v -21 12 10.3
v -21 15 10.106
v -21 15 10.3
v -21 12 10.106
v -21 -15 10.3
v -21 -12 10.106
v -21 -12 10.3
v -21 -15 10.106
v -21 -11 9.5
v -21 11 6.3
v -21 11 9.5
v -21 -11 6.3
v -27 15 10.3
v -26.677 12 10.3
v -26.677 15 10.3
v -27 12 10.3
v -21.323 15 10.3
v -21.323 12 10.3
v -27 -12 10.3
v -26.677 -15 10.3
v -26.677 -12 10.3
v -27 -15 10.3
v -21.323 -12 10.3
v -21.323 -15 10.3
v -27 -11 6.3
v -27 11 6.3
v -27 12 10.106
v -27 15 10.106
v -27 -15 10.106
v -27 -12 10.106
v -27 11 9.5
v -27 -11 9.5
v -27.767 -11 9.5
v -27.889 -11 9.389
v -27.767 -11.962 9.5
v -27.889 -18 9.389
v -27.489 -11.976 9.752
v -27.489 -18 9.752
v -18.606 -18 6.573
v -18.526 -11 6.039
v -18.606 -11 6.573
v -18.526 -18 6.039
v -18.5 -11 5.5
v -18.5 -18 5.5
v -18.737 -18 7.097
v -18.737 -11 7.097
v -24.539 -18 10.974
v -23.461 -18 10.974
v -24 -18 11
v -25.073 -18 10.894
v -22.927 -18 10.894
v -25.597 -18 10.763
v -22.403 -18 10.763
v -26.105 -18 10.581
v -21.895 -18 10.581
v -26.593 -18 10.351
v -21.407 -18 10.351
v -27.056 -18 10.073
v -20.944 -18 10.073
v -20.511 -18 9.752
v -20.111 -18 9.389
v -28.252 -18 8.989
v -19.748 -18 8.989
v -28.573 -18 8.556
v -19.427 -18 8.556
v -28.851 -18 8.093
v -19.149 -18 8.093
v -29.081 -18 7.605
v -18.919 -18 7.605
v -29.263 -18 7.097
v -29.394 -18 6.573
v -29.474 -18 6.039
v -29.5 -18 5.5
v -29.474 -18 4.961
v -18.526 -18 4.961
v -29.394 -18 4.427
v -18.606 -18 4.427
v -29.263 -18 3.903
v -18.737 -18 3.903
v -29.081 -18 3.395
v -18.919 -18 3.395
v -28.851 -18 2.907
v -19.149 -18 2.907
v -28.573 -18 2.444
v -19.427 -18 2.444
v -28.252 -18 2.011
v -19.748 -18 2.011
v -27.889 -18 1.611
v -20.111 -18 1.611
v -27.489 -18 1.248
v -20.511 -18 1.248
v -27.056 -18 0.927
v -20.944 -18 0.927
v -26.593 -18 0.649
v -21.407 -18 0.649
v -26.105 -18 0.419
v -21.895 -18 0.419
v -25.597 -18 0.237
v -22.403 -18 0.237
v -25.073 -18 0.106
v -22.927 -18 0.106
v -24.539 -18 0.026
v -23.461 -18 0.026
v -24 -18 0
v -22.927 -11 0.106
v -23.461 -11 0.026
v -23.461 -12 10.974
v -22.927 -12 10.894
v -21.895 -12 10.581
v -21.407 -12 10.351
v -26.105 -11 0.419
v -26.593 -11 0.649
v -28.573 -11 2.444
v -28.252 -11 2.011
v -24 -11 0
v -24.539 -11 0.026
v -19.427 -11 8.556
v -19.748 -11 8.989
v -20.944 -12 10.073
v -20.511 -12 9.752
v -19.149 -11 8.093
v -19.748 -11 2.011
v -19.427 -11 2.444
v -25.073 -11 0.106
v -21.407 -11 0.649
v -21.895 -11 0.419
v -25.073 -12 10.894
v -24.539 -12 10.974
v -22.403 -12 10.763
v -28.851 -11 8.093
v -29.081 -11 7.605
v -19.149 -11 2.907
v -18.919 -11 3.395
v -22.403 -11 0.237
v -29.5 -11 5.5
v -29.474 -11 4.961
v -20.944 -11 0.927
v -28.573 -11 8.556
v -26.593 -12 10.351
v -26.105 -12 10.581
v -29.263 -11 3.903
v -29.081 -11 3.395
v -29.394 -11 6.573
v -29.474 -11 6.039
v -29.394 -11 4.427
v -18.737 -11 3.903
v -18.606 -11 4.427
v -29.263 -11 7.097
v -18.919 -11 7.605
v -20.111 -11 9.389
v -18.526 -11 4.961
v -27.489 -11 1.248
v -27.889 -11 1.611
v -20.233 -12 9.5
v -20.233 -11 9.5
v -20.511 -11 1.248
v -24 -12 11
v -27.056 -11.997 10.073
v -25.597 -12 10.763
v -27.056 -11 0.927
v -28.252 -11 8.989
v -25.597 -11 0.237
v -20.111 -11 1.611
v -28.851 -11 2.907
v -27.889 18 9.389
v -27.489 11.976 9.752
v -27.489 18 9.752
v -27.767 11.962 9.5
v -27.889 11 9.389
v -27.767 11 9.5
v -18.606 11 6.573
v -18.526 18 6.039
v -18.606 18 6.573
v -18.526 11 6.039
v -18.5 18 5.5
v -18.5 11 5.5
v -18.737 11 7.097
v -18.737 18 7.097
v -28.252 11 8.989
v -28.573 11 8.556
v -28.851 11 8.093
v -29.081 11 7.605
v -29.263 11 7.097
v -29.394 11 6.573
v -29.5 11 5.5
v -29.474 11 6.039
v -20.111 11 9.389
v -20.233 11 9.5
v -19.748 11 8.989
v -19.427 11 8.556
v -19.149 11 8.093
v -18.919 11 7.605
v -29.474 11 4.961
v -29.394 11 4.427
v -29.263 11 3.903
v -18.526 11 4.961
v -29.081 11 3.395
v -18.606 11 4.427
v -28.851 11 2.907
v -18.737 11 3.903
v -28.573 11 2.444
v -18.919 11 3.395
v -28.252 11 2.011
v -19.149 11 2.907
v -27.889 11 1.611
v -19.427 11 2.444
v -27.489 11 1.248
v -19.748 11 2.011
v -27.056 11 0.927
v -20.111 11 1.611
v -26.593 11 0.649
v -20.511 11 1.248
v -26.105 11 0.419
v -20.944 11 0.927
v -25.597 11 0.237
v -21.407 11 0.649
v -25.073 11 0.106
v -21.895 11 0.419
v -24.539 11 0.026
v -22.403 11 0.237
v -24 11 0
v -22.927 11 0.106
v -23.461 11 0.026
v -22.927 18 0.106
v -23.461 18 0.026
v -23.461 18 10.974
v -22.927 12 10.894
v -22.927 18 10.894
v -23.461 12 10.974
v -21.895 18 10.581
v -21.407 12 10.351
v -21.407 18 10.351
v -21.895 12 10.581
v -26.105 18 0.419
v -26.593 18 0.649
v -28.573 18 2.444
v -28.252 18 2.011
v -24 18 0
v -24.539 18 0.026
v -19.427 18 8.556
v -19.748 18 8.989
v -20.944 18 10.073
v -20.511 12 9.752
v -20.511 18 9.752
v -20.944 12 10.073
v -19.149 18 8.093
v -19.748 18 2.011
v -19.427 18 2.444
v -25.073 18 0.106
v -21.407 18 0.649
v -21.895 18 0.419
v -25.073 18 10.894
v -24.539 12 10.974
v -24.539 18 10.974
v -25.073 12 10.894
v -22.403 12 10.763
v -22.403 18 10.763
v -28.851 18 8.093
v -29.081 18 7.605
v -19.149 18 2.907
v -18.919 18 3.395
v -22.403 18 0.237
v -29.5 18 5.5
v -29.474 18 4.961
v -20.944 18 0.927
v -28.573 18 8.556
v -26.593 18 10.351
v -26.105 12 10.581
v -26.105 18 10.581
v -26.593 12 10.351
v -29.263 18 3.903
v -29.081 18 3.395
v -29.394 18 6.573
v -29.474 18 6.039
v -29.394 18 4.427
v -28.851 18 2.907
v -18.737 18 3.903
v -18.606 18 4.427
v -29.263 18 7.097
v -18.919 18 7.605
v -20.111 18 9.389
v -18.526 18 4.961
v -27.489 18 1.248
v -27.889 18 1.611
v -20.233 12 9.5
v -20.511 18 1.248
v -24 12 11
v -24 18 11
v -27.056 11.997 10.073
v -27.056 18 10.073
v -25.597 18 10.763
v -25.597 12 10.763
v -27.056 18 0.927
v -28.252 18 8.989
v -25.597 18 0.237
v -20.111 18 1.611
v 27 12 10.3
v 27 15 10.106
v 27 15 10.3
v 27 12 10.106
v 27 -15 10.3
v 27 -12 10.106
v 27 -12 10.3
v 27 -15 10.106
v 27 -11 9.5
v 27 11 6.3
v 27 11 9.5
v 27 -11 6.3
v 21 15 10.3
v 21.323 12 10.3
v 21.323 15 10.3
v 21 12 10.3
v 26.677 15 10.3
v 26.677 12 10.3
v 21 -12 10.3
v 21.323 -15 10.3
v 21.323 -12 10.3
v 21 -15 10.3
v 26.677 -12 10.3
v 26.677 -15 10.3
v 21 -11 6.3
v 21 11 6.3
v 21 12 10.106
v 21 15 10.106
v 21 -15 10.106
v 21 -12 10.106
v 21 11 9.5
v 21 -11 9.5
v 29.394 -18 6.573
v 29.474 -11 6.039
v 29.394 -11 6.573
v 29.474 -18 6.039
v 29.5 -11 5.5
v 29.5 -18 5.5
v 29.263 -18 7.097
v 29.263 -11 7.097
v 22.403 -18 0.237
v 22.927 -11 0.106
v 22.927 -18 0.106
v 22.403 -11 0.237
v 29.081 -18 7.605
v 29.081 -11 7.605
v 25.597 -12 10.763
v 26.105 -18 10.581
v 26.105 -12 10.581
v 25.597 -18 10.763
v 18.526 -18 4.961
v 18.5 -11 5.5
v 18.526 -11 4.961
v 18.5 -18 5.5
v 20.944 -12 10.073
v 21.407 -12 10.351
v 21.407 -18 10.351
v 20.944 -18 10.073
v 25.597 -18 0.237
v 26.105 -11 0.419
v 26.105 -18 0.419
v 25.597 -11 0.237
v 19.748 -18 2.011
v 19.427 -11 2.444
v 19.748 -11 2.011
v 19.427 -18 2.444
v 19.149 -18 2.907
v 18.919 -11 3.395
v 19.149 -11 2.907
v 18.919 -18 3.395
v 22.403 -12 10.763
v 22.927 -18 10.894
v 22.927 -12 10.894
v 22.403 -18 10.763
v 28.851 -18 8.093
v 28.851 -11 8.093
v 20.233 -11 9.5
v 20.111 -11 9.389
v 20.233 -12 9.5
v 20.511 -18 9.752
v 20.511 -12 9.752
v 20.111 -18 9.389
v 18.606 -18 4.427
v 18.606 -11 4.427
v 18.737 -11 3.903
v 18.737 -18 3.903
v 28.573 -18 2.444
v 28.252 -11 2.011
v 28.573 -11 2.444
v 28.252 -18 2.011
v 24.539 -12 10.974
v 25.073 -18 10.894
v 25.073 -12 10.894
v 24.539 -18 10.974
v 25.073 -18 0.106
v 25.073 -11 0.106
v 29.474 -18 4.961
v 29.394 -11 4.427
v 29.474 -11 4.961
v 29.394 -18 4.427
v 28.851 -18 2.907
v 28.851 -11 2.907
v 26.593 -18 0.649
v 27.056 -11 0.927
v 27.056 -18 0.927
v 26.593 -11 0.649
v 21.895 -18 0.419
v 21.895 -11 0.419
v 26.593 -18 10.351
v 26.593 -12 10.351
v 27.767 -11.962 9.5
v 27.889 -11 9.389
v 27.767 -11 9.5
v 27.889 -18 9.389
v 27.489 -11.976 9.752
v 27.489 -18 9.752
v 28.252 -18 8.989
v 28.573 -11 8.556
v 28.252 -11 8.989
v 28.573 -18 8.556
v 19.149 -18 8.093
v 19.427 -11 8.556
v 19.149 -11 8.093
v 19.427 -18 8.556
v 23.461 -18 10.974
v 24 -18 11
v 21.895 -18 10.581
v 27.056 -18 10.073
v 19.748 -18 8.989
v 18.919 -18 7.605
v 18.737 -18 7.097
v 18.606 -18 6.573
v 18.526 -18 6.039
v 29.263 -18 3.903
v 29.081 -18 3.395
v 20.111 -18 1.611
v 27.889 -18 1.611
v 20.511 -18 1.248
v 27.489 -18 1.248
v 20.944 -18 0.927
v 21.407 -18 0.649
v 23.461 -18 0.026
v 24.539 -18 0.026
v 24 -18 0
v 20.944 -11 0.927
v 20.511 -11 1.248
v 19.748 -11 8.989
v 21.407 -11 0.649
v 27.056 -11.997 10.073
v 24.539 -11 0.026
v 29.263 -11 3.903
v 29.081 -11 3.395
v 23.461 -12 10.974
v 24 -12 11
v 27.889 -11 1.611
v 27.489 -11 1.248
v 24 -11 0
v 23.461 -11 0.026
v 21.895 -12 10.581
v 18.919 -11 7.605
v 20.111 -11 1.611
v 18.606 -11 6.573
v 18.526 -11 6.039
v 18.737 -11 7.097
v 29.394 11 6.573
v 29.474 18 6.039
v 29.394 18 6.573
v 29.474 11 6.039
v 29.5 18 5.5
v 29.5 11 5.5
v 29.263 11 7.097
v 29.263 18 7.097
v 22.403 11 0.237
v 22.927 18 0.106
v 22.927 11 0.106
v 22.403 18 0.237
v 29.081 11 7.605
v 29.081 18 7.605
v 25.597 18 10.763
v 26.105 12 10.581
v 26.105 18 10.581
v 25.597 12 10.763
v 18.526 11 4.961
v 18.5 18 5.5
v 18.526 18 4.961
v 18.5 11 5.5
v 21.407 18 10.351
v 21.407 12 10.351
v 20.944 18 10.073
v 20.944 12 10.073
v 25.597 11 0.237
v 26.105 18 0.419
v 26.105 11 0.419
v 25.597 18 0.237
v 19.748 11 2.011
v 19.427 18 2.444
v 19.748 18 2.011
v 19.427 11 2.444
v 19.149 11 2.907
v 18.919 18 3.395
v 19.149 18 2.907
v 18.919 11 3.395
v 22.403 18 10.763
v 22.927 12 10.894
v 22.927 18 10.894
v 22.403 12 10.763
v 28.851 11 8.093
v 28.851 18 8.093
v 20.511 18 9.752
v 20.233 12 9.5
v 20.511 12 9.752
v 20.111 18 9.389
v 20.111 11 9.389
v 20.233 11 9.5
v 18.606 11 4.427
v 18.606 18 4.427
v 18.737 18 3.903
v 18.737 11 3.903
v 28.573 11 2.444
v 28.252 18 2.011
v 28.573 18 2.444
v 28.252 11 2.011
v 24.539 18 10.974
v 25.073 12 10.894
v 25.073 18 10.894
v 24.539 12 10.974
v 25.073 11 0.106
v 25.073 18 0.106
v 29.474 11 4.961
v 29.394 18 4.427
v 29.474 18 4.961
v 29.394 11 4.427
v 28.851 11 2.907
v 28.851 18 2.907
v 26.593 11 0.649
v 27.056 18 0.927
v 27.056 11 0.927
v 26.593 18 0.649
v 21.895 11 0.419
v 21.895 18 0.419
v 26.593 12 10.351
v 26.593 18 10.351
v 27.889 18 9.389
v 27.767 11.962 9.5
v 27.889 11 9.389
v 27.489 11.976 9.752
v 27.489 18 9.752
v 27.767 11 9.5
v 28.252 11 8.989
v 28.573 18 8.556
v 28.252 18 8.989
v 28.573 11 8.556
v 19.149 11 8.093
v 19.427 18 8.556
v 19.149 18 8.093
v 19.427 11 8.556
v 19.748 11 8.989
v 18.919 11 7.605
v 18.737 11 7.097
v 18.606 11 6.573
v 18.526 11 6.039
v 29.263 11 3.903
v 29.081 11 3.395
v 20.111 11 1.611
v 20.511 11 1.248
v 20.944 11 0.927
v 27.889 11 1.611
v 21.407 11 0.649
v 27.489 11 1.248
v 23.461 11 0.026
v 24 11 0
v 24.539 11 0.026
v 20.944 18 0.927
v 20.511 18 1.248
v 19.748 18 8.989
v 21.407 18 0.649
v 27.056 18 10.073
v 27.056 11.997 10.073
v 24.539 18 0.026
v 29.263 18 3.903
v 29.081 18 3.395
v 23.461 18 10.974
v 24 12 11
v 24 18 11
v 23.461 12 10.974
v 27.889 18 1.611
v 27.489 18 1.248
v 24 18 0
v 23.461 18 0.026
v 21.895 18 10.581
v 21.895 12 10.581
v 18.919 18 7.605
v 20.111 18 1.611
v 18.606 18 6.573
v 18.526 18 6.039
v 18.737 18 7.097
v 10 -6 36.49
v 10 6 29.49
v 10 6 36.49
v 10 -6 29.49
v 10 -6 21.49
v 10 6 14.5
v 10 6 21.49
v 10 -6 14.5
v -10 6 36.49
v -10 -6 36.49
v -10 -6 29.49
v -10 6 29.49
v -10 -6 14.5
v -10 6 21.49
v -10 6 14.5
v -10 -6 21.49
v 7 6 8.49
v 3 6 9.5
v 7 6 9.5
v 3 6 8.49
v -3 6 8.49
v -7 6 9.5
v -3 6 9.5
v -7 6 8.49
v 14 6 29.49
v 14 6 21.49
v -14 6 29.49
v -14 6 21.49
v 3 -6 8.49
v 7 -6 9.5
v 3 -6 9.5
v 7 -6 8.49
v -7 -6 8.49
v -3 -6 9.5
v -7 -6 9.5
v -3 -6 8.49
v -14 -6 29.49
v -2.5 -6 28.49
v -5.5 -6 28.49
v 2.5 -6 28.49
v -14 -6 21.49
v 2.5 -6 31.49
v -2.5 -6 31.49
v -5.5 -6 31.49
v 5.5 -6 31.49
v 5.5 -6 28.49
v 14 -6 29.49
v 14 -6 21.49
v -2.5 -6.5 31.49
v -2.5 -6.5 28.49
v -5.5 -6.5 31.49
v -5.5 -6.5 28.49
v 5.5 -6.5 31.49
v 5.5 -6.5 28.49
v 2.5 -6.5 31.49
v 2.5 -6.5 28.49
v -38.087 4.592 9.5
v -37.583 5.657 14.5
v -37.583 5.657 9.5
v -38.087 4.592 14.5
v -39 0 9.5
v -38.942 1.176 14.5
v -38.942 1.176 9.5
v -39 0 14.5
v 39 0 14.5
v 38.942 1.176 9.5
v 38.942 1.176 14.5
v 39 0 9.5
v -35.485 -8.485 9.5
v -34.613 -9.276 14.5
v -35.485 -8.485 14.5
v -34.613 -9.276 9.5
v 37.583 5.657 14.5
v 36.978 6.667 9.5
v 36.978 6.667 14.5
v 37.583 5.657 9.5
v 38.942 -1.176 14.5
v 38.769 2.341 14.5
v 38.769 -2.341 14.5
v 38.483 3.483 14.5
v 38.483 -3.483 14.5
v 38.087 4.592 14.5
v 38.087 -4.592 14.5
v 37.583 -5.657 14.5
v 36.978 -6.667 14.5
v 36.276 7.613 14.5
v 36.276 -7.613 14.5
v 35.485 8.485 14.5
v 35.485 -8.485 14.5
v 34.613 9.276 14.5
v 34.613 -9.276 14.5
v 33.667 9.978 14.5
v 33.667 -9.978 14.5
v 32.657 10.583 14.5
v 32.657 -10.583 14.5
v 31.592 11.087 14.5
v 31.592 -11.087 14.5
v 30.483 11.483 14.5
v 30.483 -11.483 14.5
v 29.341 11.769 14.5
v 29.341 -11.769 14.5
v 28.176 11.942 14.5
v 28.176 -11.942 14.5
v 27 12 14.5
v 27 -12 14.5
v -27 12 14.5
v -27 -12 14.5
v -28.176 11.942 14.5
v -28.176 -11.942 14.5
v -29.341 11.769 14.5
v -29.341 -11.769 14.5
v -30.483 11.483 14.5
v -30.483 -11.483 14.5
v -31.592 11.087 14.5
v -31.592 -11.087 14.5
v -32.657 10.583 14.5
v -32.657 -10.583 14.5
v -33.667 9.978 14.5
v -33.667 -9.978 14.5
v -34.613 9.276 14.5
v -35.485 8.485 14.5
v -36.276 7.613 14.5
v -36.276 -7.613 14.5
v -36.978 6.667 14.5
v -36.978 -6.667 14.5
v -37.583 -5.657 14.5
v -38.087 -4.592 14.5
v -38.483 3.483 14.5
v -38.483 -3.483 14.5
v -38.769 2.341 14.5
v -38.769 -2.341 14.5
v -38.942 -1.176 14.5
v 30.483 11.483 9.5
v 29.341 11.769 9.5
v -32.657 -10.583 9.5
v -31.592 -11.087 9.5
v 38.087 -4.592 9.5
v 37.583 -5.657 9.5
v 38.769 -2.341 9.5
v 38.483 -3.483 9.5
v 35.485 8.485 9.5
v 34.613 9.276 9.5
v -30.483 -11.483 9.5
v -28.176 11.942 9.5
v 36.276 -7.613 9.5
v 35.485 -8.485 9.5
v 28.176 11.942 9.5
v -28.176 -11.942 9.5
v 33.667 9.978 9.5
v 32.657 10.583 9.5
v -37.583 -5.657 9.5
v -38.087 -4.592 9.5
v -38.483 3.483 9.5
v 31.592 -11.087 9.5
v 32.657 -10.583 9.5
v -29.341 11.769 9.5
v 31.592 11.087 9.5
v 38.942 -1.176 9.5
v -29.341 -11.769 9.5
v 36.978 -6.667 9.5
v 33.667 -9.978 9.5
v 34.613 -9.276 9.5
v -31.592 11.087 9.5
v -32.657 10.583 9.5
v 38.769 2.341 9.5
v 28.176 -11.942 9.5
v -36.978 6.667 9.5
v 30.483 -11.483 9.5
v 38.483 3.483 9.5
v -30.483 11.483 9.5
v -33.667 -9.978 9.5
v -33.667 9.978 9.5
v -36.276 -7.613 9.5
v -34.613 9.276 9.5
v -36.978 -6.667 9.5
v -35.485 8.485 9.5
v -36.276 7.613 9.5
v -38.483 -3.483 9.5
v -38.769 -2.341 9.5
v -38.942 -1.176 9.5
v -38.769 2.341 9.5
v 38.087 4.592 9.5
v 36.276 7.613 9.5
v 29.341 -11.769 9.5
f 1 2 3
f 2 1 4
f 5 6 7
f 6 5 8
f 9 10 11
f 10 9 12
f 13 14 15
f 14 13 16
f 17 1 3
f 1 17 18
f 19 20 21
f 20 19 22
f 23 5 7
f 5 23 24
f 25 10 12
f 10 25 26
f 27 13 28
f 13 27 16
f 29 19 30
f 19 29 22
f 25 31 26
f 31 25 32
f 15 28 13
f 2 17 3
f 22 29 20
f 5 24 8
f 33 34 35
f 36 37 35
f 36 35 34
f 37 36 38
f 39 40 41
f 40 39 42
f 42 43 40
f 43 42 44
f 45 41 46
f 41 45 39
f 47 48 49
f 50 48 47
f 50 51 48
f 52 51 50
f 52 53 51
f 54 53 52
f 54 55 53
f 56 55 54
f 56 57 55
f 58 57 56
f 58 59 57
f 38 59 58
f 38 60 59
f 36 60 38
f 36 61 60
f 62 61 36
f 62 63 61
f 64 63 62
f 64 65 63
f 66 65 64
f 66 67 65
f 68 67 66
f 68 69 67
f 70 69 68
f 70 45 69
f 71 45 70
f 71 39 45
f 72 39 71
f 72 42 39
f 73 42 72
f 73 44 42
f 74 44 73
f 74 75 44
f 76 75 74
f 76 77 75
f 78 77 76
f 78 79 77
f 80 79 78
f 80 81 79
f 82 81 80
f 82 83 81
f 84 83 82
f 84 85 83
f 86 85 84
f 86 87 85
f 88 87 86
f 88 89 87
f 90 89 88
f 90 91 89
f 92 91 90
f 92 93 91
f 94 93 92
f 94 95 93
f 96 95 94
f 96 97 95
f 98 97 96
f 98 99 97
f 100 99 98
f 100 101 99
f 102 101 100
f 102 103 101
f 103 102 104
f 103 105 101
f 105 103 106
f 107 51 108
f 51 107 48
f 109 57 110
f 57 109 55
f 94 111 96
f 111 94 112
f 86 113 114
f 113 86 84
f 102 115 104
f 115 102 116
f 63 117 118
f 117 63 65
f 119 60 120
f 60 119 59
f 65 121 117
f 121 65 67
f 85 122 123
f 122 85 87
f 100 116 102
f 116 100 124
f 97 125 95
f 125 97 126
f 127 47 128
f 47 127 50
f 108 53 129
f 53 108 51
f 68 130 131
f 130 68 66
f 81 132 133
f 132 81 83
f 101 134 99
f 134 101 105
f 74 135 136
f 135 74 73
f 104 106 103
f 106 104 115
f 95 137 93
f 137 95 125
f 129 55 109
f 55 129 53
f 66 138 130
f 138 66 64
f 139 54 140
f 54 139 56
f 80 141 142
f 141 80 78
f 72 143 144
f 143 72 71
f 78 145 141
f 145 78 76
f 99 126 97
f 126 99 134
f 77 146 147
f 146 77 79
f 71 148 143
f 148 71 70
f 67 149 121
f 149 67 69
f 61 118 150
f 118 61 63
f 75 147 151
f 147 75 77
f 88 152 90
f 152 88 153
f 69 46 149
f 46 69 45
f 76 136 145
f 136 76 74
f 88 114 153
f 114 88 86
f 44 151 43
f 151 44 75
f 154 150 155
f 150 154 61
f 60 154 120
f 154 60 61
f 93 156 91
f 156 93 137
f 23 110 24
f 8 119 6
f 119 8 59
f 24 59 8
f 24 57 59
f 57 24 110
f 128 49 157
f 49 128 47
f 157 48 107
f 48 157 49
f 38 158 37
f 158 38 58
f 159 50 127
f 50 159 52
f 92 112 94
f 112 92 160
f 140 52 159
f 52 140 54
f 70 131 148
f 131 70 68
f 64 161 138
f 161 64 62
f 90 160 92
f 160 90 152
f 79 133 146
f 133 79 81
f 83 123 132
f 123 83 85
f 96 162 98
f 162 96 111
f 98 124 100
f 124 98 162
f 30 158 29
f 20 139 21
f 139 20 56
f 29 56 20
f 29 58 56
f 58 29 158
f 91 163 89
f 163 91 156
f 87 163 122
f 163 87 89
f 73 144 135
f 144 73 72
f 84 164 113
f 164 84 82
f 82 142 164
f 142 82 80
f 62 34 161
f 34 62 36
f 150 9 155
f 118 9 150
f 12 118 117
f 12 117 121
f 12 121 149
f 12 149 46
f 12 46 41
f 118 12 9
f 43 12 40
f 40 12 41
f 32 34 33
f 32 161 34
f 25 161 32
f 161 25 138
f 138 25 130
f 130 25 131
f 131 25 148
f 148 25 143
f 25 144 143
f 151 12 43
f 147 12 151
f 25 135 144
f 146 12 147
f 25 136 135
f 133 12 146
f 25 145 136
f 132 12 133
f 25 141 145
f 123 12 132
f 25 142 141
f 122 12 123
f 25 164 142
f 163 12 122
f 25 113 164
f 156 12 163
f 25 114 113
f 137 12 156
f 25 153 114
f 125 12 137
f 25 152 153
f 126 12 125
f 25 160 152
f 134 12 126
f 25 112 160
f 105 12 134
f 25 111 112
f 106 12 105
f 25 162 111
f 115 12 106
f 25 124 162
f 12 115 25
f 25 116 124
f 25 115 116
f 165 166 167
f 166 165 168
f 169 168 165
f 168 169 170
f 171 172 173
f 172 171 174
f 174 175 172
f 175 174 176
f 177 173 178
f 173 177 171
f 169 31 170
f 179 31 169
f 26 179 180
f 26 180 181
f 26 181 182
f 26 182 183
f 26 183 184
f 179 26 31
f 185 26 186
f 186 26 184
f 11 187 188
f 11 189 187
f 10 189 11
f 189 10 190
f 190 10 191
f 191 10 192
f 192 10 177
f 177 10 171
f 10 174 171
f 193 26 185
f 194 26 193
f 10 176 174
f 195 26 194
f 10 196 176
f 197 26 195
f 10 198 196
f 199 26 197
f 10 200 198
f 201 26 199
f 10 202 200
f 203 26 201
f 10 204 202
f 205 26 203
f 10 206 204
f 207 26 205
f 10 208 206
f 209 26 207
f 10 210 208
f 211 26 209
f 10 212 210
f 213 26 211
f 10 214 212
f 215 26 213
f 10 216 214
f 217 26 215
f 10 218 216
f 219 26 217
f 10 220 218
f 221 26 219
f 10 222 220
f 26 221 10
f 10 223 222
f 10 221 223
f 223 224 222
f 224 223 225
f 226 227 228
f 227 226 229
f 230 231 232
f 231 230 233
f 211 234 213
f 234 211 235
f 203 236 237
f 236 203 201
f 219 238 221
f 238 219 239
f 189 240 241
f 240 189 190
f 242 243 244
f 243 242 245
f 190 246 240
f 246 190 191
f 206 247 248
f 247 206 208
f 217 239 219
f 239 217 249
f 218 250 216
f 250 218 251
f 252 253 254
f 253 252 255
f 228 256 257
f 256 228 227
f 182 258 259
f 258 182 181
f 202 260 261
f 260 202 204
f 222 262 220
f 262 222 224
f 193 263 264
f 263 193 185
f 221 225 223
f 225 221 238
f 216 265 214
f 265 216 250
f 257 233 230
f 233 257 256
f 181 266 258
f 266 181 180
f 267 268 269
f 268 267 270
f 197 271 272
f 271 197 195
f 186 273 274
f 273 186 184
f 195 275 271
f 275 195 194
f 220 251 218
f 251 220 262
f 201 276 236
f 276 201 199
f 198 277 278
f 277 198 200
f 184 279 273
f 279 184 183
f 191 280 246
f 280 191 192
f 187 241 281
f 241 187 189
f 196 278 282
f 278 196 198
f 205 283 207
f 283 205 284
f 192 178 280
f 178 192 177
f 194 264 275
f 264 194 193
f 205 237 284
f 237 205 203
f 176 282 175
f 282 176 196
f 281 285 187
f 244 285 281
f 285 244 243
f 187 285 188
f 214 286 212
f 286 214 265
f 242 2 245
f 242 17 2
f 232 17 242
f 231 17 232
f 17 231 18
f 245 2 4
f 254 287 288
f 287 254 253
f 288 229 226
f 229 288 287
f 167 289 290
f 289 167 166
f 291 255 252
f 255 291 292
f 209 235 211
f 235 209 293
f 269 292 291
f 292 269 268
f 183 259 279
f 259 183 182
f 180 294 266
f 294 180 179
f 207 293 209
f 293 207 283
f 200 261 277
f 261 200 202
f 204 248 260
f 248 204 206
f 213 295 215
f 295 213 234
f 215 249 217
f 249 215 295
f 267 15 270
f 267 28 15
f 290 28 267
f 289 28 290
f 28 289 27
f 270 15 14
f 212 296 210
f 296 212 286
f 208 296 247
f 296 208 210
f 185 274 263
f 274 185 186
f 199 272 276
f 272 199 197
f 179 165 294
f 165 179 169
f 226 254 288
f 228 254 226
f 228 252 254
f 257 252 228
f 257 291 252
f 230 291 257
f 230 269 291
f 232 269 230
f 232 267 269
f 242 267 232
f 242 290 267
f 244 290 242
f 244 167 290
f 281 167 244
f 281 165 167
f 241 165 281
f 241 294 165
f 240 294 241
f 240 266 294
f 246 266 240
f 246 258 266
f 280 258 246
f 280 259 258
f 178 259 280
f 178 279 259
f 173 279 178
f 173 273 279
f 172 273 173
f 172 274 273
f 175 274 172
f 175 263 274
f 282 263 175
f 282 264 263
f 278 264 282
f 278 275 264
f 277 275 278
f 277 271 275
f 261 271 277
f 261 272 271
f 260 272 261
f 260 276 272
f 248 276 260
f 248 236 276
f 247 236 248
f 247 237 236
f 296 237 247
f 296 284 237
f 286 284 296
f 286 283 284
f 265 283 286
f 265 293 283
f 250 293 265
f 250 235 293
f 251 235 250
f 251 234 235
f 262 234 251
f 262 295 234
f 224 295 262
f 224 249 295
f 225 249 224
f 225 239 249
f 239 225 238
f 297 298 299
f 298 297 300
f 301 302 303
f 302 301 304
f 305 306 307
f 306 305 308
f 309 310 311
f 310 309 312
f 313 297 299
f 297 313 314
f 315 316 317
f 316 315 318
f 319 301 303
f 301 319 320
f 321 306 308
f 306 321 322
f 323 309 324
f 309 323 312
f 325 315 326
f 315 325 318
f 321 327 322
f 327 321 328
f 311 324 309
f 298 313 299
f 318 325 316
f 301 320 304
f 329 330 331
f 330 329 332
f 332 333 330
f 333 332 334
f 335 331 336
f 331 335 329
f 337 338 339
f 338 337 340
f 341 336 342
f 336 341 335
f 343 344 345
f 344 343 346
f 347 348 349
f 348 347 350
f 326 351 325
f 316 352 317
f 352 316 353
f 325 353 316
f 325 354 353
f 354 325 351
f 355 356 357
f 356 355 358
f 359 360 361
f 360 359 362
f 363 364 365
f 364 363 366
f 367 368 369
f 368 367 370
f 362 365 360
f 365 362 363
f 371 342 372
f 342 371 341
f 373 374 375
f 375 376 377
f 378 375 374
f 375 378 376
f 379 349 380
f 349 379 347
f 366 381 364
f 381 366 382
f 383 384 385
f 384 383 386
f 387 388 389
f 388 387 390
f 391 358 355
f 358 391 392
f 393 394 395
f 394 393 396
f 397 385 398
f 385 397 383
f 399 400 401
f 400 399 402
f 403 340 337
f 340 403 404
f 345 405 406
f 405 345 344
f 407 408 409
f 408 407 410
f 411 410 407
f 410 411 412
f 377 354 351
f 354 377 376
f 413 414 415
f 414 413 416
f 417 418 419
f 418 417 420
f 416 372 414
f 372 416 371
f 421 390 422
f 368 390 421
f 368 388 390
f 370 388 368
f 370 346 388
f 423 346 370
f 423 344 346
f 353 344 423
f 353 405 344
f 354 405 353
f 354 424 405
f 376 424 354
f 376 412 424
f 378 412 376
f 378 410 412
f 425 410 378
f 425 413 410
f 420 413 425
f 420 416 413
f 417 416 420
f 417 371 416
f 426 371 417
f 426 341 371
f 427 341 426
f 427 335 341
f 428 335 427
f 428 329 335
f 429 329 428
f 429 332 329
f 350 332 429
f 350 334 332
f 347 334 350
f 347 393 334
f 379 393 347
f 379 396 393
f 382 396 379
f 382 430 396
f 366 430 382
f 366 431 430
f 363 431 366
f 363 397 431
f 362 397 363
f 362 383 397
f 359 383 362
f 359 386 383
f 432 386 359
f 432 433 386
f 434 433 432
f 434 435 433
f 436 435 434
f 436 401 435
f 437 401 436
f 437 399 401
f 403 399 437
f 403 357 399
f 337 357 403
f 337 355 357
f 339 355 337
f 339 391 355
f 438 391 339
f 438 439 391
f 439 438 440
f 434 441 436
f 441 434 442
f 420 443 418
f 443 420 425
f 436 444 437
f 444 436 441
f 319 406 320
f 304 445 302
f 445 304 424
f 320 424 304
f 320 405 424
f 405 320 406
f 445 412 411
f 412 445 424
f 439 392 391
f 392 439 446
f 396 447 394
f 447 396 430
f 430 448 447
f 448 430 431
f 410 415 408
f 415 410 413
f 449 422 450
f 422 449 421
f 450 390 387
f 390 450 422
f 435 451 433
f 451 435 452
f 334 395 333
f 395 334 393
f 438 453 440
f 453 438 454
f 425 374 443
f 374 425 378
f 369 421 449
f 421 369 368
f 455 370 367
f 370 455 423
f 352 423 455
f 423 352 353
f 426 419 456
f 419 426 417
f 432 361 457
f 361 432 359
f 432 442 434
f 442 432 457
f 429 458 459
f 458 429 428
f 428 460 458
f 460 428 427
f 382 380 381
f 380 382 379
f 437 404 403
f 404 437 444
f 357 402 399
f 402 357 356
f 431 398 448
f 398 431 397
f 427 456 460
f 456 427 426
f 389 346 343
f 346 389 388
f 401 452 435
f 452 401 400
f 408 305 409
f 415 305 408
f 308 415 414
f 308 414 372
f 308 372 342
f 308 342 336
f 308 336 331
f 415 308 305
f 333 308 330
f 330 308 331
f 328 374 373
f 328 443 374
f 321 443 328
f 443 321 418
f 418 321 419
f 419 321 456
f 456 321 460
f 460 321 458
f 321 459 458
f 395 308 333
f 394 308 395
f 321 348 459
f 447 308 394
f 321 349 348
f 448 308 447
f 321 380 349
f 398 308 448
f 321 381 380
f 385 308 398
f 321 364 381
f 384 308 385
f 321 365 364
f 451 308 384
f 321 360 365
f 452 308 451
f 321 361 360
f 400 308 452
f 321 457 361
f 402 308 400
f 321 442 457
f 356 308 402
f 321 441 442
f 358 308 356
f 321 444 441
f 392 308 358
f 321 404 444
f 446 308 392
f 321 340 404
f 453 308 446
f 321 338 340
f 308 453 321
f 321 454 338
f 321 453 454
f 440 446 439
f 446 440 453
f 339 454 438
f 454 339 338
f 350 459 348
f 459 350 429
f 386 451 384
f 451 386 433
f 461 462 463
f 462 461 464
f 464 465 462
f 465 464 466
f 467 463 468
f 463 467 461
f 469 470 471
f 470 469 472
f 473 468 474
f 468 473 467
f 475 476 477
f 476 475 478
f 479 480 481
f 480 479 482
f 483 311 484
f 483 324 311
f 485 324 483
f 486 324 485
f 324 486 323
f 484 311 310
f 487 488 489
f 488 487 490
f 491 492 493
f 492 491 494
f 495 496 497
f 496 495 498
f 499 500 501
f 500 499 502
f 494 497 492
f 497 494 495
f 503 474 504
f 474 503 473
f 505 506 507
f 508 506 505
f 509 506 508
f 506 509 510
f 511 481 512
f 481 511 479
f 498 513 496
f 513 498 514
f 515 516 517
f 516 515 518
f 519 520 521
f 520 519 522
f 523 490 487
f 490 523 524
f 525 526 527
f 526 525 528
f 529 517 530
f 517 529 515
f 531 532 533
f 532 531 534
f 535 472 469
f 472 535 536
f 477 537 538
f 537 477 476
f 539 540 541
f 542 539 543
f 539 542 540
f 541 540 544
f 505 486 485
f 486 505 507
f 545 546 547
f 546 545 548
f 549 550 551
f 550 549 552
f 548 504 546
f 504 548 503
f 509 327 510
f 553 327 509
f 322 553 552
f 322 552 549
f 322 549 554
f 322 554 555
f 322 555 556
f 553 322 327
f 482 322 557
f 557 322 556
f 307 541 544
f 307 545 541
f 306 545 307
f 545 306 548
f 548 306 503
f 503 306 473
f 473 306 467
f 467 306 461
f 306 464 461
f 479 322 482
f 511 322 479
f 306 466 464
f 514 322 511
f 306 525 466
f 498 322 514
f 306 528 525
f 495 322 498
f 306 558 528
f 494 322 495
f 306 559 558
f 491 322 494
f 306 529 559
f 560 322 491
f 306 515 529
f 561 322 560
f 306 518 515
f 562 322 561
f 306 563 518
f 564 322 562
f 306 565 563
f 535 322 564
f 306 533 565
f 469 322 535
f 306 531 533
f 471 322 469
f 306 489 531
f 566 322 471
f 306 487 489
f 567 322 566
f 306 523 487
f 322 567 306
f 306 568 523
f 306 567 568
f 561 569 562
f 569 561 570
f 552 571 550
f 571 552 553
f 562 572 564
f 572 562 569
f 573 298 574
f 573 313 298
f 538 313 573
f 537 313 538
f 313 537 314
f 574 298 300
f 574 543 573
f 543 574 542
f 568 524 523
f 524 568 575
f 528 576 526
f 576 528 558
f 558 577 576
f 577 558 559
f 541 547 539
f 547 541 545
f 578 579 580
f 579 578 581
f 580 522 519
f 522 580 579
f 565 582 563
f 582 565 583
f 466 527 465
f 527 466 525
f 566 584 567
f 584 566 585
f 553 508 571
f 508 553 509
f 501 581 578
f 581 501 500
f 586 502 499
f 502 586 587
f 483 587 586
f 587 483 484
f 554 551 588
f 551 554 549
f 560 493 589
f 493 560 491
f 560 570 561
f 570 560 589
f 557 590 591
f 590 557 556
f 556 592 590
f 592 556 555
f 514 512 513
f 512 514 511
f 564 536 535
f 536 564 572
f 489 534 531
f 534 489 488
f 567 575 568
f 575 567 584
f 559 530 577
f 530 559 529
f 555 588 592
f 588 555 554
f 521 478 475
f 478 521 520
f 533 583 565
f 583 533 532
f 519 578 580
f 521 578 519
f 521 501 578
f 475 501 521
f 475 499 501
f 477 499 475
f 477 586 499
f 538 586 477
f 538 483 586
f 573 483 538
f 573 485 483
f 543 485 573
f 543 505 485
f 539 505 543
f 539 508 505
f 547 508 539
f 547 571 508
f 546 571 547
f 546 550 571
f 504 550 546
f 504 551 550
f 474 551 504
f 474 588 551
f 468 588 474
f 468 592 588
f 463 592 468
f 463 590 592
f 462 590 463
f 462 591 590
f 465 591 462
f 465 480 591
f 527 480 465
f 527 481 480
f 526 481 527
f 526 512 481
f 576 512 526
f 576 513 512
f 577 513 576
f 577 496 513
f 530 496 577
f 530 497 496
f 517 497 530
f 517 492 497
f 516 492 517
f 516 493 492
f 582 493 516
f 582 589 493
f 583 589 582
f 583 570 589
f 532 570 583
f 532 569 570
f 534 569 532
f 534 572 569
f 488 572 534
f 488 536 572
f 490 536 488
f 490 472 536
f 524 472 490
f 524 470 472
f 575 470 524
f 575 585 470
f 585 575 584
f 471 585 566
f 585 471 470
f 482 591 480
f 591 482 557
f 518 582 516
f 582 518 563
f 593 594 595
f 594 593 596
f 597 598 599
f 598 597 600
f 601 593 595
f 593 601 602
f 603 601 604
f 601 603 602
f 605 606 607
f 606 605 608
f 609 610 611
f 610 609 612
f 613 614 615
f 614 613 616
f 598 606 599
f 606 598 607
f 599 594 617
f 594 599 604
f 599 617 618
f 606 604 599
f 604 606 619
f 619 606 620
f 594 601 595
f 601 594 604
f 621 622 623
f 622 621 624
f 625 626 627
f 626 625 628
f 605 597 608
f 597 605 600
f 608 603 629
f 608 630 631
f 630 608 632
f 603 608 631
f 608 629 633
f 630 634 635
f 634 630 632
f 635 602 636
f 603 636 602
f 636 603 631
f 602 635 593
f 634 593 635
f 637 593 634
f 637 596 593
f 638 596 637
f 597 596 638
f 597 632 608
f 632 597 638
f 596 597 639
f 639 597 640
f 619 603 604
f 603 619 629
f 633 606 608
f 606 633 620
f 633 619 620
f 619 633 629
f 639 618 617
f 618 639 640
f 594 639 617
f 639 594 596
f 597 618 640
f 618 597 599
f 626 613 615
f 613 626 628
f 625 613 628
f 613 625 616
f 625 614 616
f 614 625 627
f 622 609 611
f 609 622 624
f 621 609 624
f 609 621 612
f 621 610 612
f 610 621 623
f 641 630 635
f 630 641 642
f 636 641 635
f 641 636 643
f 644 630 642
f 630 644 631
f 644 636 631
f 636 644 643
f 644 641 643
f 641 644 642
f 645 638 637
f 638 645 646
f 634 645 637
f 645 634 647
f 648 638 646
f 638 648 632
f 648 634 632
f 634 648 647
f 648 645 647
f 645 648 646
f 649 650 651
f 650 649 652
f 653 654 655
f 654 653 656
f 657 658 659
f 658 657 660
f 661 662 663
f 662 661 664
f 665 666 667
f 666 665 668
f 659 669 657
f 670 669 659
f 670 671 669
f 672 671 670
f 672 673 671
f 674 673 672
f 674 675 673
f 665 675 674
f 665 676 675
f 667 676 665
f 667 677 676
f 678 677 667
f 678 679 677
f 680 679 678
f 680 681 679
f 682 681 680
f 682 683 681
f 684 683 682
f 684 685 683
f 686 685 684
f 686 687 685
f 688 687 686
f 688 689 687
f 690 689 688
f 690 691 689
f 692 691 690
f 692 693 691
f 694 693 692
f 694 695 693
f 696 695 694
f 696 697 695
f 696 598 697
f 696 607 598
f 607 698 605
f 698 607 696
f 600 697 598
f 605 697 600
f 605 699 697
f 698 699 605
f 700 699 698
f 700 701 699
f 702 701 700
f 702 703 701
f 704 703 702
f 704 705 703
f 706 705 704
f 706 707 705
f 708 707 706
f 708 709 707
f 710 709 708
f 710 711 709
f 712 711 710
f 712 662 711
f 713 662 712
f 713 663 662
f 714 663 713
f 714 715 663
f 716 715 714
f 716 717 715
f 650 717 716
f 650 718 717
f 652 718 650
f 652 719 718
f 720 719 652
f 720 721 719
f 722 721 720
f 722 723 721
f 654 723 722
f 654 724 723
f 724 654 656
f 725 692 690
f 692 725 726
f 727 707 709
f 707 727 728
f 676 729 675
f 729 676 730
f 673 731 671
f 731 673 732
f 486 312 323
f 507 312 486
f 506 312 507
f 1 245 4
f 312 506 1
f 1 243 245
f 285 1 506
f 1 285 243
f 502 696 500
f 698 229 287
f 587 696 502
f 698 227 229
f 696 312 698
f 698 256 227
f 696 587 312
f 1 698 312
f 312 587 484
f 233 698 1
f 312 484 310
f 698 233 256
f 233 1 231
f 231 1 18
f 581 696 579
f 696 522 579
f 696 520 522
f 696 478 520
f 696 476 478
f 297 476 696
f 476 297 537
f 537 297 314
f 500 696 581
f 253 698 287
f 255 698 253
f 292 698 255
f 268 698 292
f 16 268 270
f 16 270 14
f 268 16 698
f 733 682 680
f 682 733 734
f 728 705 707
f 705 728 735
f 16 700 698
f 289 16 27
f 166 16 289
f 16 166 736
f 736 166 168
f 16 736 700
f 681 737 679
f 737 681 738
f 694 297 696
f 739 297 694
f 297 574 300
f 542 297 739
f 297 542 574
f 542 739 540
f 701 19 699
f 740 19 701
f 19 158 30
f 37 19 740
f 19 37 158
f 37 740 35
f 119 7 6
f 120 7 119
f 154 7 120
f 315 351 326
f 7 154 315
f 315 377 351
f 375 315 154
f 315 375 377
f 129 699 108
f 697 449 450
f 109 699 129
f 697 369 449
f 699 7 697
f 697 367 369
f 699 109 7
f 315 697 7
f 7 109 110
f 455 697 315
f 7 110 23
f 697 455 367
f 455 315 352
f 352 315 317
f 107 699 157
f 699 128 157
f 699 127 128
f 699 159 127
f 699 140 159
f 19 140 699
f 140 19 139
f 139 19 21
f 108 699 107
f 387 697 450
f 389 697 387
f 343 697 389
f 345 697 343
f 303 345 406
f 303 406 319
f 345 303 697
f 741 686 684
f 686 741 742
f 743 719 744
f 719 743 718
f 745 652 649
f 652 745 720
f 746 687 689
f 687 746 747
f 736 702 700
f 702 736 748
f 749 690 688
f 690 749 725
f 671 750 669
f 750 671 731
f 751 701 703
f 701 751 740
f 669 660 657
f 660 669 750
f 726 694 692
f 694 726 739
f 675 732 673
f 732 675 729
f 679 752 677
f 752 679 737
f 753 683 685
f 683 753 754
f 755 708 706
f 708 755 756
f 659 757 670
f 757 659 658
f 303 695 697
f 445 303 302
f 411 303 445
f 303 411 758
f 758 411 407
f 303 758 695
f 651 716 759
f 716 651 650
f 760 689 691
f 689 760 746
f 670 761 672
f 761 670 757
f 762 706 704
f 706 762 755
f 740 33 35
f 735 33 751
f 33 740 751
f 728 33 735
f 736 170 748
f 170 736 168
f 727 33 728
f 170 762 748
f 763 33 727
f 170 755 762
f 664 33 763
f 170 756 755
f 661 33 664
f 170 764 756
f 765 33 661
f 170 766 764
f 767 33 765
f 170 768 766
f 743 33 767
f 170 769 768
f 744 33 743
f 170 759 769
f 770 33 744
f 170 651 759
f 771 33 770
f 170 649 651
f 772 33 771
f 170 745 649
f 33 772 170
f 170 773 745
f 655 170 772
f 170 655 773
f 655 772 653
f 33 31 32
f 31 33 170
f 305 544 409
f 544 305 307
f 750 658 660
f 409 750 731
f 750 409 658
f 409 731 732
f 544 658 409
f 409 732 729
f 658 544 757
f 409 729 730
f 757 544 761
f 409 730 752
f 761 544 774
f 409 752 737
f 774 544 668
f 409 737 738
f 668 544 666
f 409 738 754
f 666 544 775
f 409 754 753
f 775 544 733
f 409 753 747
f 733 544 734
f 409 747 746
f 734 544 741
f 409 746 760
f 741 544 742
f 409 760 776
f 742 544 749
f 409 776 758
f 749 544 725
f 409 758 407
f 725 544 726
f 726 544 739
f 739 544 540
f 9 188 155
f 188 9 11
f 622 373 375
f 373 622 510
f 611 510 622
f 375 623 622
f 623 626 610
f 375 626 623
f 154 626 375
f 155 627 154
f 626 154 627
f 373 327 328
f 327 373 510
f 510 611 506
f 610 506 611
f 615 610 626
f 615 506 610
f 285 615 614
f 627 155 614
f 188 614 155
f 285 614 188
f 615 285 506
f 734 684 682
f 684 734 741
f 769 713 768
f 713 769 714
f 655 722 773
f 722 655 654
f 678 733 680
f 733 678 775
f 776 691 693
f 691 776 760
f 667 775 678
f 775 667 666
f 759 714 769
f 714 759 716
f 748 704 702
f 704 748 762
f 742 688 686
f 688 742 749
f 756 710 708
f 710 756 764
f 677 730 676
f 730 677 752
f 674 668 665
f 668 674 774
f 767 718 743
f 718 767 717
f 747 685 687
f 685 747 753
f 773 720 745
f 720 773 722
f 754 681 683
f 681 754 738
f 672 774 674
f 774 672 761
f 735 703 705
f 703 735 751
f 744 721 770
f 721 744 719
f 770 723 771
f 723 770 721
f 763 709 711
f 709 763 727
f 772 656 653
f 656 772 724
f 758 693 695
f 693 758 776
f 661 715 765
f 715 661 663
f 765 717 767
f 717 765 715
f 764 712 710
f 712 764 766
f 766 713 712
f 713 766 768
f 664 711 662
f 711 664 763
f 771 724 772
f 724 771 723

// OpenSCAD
// Skateboard Charm - Version 001
// Generated from reference image: references/17_clawd_skateboard.png
// Solid skateboard figurine with wheels and a simple rider silhouette.

eps = 0.01;
$fn = 64;

deck_len = 78;
deck_w = 24;
deck_h = 5;
wheel_d = 11;
wheel_w = 7;
truck_w = 30;
truck_h = 4;
rider_w = 20;
rider_h = 22;
rider_d = 12;

module capsule_2d(len, w) {
    hull() {
        translate([-len / 2 + w / 2, 0])
            circle(d = w);
        translate([len / 2 - w / 2, 0])
            circle(d = w);
    }
}

module deck() {
    color([0.32, 0.42, 0.70])
        translate([0, 0, wheel_d / 2 + truck_h])
            linear_extrude(height = deck_h)
                capsule_2d(deck_len, deck_w);
}

module truck(x) {
    color([0.58, 0.58, 0.58])
        translate([x, 0, wheel_d / 2 + 2.8])
            cube([6, truck_w, truck_h], center = true);
}

module wheel(x, y) {
    color([0.05, 0.05, 0.06])
        translate([x, y, wheel_d / 2])
            rotate([90, 0, 0])
                cylinder(h = wheel_w, d = wheel_d, center = true);
}

module rider() {
    z0 = wheel_d / 2 + truck_h + deck_h - eps;
    color([0.86, 0.48, 0.35])
        translate([-rider_w / 2, -rider_d / 2, z0])
            union() {
                cube([rider_w, rider_d, rider_h]);

                translate([-4, 0, 7])
                    cube([4, rider_d, 8]);
                translate([rider_w, 0, 7])
                    cube([4, rider_d, 8]);
                translate([3, 0, -6])
                    cube([4, rider_d, 6]);
                translate([rider_w - 7, 0, -6])
                    cube([4, rider_d, 6]);
            }

    color([0.03, 0.03, 0.03]) {
        translate([-5.5, -rider_d / 2 - 0.5, z0 + 14])
            cube([3, 1.2, 3]);
        translate([2.5, -rider_d / 2 - 0.5, z0 + 14])
            cube([3, 1.2, 3]);
    }
}

module model() {
    union() {
        deck();

        for (x = [-24, 24]) {
            truck(x);
            wheel(x, -deck_w / 2 - 2.5);
            wheel(x, deck_w / 2 + 2.5);
        }

        rider();
    }
}

model();
